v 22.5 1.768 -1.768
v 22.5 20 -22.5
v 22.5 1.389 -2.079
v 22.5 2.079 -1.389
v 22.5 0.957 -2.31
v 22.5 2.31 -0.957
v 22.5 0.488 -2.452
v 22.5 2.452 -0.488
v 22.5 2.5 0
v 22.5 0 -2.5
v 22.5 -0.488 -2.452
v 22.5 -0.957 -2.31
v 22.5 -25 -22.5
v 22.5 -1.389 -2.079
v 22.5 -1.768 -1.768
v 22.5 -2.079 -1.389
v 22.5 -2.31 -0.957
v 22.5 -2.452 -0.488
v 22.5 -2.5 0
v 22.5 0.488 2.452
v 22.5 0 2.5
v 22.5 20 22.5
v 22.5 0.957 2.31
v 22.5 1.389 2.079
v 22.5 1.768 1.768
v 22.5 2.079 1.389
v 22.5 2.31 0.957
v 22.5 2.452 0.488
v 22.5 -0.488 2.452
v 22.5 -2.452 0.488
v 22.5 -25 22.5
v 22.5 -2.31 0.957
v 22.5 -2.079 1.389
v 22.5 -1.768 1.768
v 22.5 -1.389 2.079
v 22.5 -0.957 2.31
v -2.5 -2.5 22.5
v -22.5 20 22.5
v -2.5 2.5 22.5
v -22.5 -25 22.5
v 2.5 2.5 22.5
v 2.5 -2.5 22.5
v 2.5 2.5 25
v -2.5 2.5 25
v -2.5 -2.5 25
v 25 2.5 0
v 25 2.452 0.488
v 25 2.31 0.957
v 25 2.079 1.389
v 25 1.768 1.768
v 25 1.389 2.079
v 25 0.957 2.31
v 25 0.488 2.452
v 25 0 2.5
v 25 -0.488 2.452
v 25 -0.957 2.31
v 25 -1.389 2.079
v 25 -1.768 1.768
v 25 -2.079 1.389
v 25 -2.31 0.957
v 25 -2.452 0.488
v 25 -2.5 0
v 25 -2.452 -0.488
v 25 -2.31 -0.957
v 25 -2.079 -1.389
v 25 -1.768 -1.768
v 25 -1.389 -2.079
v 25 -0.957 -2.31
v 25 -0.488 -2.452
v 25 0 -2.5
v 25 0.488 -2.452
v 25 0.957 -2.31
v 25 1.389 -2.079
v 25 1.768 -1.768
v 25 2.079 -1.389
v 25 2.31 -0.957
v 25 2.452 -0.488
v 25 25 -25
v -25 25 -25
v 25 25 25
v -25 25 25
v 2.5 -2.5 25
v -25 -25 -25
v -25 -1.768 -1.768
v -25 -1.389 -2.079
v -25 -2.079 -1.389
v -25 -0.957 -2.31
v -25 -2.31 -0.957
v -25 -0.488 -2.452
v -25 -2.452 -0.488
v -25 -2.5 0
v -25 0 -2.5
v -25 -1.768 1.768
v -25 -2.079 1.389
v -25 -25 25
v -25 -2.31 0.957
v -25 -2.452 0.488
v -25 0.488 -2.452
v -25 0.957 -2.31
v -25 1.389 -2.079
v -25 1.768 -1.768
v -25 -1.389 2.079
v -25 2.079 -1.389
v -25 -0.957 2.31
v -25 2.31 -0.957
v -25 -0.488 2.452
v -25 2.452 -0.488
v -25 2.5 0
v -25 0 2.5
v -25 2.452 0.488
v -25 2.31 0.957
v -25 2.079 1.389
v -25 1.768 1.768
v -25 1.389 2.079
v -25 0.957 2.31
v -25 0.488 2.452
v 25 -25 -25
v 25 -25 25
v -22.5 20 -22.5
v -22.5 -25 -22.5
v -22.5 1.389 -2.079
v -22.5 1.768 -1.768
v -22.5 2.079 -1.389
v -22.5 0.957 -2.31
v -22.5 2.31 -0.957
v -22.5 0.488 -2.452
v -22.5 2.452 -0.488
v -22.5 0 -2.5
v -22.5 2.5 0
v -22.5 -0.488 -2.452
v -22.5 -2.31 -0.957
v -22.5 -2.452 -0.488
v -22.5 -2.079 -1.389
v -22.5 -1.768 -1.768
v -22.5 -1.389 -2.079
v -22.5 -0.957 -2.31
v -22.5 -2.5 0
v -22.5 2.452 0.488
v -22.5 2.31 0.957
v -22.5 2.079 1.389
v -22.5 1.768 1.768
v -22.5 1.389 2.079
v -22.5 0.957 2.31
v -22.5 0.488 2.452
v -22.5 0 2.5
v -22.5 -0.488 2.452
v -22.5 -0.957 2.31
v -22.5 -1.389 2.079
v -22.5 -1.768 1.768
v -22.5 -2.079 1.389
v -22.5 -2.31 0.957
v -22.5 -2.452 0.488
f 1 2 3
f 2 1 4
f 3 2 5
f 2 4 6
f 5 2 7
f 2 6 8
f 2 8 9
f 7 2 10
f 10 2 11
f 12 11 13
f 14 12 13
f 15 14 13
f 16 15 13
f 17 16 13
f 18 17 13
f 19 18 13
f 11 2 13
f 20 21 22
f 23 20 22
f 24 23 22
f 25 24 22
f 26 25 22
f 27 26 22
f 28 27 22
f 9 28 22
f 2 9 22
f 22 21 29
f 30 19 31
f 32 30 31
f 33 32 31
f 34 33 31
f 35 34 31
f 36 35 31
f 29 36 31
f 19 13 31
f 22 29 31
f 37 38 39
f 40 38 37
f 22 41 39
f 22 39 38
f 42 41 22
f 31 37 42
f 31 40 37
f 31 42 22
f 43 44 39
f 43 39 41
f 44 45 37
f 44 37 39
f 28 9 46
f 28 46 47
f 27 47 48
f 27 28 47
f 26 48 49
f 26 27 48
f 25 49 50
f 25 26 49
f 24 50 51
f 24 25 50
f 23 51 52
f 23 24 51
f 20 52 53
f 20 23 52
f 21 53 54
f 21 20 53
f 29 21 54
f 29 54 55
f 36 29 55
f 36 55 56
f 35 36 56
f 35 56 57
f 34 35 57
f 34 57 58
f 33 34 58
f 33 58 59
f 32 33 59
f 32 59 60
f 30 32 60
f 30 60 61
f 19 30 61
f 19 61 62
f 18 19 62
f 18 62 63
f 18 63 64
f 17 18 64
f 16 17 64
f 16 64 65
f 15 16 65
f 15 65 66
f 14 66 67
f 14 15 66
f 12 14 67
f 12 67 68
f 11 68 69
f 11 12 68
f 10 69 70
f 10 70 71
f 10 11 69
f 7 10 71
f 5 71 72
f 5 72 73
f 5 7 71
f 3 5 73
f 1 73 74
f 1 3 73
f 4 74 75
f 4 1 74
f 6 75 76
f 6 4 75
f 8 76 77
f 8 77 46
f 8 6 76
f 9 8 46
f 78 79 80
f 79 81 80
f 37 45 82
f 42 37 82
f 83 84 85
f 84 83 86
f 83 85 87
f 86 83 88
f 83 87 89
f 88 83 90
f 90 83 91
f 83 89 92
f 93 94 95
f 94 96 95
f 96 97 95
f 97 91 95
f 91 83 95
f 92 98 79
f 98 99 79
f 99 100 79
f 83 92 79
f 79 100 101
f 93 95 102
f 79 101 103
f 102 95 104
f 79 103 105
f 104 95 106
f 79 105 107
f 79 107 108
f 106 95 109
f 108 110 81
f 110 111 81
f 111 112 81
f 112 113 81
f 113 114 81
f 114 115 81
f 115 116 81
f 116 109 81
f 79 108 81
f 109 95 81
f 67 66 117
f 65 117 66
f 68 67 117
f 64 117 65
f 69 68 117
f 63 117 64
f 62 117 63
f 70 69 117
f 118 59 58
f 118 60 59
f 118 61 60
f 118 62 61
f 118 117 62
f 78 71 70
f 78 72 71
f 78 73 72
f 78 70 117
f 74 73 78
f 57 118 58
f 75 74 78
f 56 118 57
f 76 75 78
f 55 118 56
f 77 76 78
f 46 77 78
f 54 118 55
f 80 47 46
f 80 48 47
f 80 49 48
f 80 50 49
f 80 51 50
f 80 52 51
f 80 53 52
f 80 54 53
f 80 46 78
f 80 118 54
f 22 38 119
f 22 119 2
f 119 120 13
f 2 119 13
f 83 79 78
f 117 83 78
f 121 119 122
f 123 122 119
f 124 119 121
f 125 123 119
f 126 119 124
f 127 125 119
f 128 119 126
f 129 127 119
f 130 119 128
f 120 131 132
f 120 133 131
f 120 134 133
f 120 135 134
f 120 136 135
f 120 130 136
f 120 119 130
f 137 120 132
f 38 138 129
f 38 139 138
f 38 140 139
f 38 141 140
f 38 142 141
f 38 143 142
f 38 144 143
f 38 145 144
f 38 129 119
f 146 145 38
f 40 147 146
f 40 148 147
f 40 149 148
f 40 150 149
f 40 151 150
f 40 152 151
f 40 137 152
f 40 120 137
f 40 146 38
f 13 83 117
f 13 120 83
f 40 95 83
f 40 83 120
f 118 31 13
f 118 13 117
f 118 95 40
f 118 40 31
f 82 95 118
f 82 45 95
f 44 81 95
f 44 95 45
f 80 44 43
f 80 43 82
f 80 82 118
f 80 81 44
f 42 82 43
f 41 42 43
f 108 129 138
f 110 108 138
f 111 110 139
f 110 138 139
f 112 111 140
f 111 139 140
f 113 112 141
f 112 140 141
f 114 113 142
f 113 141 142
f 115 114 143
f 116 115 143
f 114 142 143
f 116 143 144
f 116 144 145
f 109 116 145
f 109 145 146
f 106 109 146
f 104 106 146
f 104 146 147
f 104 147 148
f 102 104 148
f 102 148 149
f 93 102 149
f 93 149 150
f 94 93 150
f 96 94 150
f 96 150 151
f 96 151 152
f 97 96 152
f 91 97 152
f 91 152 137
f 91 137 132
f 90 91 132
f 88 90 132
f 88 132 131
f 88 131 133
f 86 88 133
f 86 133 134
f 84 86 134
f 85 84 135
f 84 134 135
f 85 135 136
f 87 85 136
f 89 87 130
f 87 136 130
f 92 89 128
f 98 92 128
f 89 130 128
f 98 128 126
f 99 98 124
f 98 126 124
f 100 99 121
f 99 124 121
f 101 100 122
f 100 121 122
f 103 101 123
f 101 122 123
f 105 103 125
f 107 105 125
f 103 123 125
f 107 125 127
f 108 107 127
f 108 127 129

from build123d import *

# Parameters (mm, degrees)
F0_W          = 50
F0_H          = 50
F1_DEPTH      = 25
F1_DEPTH_BACK = 25
F2_W          = 45
F2_H          = 45
F3_DEPTH      = 45
F4_W          = 5
F4_H          = 5
F5_DEPTH      = 5
F6_R          = 2.5
F7_DEPTH      = 50
F7_DEPTH_BACK = 25


with BuildPart() as f1:
    # F0 (on Top) → F1 (new body, two sides)
    with BuildSketch(Plane.XY) as f1_sk:
        Rectangle(F0_W, F0_H)
    extrude(amount=F1_DEPTH)
    extrude(f1_sk.sketch, amount=-F1_DEPTH_BACK)

    # F2 (on face) → F3 (cut)
    with BuildSketch(Plane.XZ.offset(25)):
        Rectangle(F2_W, F2_H)
    extrude(amount=-F3_DEPTH, mode=Mode.SUBTRACT)

    # F4 (on face) → F5 (cut)
    with BuildSketch(Plane.XY.offset(25)):
        Rectangle(F4_W, F4_H)
    extrude(amount=-F5_DEPTH, mode=Mode.SUBTRACT)

    # F6 (on Right) → F7 (cut, two sides)
    with BuildSketch(Plane.YZ) as f7_sk:
        Circle(F6_R)
    extrude(amount=-F7_DEPTH, mode=Mode.SUBTRACT)
    extrude(f7_sk.sketch, amount=F7_DEPTH_BACK, mode=Mode.SUBTRACT)


solid = f1.part
